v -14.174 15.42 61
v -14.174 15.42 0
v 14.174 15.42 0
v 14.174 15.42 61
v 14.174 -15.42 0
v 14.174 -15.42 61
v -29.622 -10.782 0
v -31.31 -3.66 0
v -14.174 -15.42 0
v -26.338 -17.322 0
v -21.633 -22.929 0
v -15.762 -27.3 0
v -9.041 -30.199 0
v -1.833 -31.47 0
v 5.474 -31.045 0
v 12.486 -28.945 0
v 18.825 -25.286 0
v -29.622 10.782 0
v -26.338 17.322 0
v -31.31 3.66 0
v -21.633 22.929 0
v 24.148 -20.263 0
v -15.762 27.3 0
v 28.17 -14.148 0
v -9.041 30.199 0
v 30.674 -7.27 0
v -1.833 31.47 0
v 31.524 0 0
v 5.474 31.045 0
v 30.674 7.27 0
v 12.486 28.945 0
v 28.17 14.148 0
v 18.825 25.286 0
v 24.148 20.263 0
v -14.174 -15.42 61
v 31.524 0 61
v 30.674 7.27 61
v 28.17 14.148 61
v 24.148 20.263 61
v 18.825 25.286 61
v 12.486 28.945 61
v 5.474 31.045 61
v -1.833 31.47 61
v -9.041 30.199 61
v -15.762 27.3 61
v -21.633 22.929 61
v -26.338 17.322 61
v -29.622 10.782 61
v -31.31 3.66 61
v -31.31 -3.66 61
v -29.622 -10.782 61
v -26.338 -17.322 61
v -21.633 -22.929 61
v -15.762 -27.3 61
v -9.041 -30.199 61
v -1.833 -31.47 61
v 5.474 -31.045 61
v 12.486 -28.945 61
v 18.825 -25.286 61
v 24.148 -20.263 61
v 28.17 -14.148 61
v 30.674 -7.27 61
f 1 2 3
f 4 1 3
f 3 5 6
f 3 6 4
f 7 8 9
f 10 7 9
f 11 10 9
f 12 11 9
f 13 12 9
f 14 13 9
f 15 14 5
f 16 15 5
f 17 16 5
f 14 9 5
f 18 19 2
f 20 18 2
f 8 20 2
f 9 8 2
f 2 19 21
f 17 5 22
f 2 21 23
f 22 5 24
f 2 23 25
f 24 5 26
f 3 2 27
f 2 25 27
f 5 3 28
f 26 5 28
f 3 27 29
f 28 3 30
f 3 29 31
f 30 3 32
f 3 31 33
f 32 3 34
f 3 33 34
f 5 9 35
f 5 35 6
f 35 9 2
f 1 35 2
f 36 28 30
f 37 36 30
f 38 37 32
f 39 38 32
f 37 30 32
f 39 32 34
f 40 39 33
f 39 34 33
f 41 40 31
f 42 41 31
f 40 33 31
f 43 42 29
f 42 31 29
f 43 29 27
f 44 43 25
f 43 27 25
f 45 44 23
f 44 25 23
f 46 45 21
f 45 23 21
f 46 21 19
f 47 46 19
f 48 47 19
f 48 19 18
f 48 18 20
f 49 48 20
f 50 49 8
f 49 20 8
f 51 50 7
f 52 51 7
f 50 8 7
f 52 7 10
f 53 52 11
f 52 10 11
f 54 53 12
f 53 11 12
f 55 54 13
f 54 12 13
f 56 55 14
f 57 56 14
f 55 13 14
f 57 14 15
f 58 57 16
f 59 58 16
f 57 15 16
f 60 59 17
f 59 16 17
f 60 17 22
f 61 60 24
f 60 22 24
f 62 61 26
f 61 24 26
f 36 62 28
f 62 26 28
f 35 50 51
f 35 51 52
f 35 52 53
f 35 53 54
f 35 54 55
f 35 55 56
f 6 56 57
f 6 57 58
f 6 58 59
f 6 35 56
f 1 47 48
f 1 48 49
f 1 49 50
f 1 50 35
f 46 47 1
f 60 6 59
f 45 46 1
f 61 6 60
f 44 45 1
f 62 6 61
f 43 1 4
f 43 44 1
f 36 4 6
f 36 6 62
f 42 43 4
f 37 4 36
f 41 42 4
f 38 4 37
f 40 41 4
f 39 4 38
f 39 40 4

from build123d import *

# Parameters (mm, degrees)
F0_R     = 31.5235304599
F1_DEPTH = 25
F3_DEPTH = 61
F4_W     = 28.34899351
F4_H     = 30.839510262
F5_DEPTH = 75


with BuildPart() as f1:
    # F0 (on Top) → F1 (new body)
    with BuildSketch(Plane.XY):
        Circle(F0_R)
    extrude(amount=F1_DEPTH)


with BuildPart() as f3:
    # F0 (on Top) → F3 (new body)
    with BuildSketch(Plane.XY):
        Circle(F0_R)
    extrude(amount=F3_DEPTH)

    # F4 (on face) → F5 (cut)
    with BuildSketch(Plane.XY.offset(61)):
        Rectangle(F4_W, F4_H)
    extrude(amount=-F5_DEPTH, mode=Mode.SUBTRACT)


solid = f3.part
